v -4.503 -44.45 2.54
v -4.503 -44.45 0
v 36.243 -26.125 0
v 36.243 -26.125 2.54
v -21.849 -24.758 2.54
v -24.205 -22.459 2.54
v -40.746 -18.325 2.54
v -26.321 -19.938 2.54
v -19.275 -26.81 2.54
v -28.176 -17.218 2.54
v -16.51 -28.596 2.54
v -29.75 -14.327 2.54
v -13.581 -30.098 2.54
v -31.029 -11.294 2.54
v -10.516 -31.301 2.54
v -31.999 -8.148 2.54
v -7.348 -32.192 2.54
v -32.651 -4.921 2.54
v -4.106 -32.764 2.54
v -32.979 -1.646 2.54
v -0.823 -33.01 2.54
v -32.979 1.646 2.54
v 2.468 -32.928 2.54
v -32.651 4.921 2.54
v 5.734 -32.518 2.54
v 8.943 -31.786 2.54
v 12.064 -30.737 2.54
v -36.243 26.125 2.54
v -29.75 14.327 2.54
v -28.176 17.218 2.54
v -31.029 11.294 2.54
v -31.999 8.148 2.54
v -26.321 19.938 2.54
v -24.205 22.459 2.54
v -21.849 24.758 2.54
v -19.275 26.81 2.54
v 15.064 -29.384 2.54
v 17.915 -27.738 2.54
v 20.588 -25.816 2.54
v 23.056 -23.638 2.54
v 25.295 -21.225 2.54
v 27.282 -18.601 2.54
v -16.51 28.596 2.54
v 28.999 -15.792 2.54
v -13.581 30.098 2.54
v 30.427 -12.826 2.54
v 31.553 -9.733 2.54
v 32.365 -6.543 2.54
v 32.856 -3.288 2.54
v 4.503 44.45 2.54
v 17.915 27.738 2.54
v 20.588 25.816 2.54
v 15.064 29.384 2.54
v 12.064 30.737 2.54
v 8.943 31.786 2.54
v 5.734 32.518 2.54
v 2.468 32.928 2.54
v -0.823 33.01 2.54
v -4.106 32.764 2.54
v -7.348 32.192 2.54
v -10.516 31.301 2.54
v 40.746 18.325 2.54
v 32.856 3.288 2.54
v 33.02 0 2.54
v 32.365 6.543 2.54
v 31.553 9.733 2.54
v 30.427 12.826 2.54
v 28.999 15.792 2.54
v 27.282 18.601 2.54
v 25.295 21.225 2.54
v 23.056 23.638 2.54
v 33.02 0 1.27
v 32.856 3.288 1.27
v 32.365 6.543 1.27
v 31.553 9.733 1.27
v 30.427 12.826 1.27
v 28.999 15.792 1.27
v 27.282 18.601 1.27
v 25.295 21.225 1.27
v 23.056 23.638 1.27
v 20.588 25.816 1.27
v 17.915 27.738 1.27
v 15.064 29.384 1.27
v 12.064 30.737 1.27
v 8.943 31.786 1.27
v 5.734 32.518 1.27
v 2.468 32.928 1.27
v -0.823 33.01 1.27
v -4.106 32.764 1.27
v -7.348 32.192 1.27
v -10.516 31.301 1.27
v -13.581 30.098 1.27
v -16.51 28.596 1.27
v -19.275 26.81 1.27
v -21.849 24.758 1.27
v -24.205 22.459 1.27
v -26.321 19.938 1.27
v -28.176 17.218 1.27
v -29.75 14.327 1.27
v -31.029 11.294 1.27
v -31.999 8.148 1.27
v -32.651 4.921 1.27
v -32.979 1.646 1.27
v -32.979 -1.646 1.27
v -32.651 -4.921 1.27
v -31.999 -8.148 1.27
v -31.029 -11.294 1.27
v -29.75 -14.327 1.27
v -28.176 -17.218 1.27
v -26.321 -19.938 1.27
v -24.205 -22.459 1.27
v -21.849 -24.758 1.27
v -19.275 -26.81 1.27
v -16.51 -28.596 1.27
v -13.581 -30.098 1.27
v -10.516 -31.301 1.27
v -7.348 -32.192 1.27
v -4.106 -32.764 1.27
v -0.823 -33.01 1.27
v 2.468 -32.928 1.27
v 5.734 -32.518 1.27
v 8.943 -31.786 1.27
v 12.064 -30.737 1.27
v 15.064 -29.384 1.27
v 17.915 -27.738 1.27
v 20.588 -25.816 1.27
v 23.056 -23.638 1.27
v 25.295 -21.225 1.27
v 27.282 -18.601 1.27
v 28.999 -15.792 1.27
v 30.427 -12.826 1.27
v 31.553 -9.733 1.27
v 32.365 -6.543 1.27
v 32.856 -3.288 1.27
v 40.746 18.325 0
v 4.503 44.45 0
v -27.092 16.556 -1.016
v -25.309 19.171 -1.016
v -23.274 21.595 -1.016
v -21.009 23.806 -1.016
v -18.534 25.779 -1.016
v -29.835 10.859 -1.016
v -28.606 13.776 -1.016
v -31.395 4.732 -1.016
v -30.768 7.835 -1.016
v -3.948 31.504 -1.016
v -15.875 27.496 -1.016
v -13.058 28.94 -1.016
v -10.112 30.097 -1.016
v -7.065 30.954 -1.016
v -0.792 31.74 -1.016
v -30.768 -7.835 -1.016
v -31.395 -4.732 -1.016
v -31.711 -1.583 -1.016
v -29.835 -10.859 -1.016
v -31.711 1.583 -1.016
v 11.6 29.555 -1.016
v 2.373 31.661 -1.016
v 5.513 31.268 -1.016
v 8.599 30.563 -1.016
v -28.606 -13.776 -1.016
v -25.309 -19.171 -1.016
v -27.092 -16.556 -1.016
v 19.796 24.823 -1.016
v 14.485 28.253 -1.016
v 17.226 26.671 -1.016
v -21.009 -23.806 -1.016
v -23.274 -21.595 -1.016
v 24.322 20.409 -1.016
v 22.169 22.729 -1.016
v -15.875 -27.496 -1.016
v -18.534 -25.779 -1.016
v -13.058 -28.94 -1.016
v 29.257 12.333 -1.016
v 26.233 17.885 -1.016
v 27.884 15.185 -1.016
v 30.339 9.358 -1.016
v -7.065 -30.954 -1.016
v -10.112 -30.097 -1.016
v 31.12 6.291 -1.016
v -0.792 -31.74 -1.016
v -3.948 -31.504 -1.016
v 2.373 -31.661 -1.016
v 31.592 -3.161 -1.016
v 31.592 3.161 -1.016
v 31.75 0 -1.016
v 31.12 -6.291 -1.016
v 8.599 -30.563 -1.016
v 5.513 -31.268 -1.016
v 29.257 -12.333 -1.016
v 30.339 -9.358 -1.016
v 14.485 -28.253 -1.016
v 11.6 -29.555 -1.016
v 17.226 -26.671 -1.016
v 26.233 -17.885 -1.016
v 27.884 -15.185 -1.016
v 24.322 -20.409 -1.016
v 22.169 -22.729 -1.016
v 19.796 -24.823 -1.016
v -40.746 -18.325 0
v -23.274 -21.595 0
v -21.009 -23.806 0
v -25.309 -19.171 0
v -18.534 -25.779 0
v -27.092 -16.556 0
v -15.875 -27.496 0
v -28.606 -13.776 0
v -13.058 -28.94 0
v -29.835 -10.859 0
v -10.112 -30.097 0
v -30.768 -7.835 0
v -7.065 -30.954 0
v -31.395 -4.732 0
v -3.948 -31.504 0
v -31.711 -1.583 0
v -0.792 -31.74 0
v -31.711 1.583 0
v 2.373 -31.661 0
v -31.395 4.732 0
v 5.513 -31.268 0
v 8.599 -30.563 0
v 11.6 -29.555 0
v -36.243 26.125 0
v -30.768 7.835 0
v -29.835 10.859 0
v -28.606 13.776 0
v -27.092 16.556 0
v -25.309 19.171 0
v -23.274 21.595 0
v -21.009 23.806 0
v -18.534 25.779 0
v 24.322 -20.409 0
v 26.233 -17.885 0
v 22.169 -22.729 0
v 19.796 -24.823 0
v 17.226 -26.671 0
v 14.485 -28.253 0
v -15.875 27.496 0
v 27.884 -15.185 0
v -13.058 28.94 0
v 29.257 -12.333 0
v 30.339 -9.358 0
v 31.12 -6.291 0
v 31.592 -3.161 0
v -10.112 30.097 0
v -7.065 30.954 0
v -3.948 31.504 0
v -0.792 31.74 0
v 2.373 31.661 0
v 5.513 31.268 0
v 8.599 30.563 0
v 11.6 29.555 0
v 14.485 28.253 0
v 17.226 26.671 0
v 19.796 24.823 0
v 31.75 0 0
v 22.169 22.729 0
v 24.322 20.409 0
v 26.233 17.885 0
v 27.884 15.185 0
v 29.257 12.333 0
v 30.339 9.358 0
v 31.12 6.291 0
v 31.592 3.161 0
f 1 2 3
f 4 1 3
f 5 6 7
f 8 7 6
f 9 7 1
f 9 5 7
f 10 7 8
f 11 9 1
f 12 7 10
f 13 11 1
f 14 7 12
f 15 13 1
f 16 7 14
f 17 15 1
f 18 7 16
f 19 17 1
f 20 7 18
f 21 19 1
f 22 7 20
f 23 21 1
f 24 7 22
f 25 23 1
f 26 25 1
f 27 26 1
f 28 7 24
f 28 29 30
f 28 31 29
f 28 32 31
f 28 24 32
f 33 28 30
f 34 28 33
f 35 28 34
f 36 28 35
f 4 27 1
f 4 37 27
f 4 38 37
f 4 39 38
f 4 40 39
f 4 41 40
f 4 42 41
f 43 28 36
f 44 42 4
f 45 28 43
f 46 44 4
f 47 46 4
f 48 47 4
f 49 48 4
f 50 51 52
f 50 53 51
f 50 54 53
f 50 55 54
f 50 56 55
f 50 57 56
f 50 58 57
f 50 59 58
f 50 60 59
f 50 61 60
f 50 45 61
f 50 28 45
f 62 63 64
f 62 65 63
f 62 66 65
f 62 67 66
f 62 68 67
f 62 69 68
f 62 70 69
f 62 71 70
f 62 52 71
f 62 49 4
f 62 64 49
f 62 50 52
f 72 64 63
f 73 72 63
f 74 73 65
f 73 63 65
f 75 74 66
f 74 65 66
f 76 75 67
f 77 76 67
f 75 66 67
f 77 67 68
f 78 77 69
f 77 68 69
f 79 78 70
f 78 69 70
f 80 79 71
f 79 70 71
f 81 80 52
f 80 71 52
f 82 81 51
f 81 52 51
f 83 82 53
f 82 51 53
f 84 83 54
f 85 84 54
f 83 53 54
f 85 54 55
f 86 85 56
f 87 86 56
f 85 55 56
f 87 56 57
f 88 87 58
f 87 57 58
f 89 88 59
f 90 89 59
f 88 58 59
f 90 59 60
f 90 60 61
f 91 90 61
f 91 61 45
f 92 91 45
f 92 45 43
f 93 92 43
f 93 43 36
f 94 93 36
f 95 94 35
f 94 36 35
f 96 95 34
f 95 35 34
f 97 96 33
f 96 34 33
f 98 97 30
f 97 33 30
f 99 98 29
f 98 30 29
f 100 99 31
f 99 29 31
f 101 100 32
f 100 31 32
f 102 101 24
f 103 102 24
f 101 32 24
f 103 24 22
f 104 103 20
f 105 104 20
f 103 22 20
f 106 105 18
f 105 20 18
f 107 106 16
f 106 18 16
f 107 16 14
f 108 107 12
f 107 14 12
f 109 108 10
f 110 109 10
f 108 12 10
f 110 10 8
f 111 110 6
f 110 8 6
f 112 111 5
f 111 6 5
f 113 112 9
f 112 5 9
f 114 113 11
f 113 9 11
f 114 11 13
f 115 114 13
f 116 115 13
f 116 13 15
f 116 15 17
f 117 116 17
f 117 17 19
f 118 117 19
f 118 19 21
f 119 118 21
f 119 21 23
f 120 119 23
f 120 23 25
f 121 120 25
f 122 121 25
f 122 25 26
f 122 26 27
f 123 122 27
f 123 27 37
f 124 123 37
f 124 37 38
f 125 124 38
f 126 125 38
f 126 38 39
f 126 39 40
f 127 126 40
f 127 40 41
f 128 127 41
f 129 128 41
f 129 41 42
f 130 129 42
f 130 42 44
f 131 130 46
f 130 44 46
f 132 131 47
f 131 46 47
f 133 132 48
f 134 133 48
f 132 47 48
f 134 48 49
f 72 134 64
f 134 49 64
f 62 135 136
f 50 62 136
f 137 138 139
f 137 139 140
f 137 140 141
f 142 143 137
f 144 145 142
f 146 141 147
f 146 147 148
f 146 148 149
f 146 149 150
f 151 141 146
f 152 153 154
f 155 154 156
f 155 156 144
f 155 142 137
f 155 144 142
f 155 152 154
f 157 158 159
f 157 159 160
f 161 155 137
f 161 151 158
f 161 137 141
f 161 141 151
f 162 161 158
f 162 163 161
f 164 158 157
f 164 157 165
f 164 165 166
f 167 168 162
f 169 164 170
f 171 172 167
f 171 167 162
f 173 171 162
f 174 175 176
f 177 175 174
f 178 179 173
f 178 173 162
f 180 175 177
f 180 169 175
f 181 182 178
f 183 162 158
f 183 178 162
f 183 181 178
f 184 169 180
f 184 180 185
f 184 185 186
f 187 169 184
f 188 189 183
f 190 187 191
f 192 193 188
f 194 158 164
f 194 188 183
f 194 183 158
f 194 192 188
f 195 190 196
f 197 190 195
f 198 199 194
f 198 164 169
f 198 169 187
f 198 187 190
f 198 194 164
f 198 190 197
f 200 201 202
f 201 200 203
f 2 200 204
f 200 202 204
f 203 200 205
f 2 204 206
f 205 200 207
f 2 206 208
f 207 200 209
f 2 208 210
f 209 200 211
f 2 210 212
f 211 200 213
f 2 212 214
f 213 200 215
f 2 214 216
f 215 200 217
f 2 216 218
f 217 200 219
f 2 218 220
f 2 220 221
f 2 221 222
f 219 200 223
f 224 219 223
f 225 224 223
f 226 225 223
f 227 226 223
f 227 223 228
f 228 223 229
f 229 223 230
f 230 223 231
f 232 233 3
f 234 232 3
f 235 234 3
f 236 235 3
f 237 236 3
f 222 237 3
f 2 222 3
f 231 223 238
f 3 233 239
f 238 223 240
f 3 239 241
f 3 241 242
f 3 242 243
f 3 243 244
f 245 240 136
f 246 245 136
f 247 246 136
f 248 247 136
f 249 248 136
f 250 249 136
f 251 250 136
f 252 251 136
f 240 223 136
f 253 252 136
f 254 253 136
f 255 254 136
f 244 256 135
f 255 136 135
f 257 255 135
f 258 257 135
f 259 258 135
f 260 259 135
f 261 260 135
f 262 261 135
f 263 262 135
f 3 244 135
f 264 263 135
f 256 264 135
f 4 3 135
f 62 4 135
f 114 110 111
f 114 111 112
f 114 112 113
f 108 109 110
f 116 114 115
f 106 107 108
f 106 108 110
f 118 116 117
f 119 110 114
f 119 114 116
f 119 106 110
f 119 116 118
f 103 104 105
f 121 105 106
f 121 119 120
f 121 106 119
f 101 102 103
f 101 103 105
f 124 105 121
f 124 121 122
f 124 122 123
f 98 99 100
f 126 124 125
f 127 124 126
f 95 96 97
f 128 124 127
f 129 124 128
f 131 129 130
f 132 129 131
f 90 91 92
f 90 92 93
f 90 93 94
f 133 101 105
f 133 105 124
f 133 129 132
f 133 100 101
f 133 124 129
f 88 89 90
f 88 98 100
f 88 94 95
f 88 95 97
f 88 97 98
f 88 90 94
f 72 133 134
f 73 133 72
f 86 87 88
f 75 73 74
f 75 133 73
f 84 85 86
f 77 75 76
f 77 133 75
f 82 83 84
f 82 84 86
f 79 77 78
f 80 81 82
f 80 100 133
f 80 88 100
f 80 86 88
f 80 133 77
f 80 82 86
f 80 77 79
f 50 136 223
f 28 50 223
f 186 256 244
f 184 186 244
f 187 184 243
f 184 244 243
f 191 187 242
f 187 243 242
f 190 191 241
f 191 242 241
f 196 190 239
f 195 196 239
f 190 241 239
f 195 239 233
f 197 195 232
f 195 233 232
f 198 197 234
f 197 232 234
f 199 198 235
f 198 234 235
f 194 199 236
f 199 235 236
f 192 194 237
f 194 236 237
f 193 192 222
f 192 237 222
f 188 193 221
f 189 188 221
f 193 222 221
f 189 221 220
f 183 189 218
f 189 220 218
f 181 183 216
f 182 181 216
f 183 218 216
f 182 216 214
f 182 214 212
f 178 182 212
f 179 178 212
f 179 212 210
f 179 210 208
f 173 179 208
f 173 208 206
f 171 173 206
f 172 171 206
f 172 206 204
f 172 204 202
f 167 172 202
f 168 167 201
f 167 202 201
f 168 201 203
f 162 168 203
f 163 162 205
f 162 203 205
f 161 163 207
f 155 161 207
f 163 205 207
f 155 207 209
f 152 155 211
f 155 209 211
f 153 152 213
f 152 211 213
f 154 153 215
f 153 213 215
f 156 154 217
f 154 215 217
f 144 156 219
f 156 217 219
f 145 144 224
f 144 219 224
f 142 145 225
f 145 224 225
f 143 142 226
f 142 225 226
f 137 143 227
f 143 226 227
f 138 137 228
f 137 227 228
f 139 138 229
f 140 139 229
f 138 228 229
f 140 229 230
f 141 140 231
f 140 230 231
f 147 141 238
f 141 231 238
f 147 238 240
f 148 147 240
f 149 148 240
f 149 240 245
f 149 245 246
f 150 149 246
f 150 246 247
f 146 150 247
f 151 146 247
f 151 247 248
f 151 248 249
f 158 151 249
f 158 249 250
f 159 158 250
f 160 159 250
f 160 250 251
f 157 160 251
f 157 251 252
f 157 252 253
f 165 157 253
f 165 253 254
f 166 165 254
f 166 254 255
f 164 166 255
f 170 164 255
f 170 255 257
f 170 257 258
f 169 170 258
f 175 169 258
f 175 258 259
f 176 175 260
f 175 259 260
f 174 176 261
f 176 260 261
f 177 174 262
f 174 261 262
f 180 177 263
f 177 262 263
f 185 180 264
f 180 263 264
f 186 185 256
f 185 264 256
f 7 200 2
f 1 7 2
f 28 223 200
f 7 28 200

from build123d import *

# Parameters (mm, degrees)
F1_DEPTH = 2.54
F2_R     = 33.02
F3_DEPTH = 1.27
F4_R     = 31.75
F5_DEPTH = 1.016


with BuildPart() as f1:
    # F0 (on Top) → F1 (new body)
    with BuildSketch(Plane.XY):
        Polygon((-4.502899, -44.45), (36.24338, -26.124625), (40.746279, 18.325375), (4.502899, 44.45), (-36.24338, 26.124625), (-40.746279, -18.325375), align=None)
    extrude(amount=F1_DEPTH)

    # F2 (on face) → F3 (cut)
    with BuildSketch(Plane.XY.offset(2.54)):
        Circle(F2_R)
    extrude(amount=-F3_DEPTH, mode=Mode.SUBTRACT)

    # F4 (on face) → F5 (join)
    with BuildSketch(Plane(origin=(0, 0, 0), x_dir=(1, 0, 0), z_dir=(0, 0, -1))):
        Circle(F4_R)
    extrude(amount=F5_DEPTH)


solid = f1.part
